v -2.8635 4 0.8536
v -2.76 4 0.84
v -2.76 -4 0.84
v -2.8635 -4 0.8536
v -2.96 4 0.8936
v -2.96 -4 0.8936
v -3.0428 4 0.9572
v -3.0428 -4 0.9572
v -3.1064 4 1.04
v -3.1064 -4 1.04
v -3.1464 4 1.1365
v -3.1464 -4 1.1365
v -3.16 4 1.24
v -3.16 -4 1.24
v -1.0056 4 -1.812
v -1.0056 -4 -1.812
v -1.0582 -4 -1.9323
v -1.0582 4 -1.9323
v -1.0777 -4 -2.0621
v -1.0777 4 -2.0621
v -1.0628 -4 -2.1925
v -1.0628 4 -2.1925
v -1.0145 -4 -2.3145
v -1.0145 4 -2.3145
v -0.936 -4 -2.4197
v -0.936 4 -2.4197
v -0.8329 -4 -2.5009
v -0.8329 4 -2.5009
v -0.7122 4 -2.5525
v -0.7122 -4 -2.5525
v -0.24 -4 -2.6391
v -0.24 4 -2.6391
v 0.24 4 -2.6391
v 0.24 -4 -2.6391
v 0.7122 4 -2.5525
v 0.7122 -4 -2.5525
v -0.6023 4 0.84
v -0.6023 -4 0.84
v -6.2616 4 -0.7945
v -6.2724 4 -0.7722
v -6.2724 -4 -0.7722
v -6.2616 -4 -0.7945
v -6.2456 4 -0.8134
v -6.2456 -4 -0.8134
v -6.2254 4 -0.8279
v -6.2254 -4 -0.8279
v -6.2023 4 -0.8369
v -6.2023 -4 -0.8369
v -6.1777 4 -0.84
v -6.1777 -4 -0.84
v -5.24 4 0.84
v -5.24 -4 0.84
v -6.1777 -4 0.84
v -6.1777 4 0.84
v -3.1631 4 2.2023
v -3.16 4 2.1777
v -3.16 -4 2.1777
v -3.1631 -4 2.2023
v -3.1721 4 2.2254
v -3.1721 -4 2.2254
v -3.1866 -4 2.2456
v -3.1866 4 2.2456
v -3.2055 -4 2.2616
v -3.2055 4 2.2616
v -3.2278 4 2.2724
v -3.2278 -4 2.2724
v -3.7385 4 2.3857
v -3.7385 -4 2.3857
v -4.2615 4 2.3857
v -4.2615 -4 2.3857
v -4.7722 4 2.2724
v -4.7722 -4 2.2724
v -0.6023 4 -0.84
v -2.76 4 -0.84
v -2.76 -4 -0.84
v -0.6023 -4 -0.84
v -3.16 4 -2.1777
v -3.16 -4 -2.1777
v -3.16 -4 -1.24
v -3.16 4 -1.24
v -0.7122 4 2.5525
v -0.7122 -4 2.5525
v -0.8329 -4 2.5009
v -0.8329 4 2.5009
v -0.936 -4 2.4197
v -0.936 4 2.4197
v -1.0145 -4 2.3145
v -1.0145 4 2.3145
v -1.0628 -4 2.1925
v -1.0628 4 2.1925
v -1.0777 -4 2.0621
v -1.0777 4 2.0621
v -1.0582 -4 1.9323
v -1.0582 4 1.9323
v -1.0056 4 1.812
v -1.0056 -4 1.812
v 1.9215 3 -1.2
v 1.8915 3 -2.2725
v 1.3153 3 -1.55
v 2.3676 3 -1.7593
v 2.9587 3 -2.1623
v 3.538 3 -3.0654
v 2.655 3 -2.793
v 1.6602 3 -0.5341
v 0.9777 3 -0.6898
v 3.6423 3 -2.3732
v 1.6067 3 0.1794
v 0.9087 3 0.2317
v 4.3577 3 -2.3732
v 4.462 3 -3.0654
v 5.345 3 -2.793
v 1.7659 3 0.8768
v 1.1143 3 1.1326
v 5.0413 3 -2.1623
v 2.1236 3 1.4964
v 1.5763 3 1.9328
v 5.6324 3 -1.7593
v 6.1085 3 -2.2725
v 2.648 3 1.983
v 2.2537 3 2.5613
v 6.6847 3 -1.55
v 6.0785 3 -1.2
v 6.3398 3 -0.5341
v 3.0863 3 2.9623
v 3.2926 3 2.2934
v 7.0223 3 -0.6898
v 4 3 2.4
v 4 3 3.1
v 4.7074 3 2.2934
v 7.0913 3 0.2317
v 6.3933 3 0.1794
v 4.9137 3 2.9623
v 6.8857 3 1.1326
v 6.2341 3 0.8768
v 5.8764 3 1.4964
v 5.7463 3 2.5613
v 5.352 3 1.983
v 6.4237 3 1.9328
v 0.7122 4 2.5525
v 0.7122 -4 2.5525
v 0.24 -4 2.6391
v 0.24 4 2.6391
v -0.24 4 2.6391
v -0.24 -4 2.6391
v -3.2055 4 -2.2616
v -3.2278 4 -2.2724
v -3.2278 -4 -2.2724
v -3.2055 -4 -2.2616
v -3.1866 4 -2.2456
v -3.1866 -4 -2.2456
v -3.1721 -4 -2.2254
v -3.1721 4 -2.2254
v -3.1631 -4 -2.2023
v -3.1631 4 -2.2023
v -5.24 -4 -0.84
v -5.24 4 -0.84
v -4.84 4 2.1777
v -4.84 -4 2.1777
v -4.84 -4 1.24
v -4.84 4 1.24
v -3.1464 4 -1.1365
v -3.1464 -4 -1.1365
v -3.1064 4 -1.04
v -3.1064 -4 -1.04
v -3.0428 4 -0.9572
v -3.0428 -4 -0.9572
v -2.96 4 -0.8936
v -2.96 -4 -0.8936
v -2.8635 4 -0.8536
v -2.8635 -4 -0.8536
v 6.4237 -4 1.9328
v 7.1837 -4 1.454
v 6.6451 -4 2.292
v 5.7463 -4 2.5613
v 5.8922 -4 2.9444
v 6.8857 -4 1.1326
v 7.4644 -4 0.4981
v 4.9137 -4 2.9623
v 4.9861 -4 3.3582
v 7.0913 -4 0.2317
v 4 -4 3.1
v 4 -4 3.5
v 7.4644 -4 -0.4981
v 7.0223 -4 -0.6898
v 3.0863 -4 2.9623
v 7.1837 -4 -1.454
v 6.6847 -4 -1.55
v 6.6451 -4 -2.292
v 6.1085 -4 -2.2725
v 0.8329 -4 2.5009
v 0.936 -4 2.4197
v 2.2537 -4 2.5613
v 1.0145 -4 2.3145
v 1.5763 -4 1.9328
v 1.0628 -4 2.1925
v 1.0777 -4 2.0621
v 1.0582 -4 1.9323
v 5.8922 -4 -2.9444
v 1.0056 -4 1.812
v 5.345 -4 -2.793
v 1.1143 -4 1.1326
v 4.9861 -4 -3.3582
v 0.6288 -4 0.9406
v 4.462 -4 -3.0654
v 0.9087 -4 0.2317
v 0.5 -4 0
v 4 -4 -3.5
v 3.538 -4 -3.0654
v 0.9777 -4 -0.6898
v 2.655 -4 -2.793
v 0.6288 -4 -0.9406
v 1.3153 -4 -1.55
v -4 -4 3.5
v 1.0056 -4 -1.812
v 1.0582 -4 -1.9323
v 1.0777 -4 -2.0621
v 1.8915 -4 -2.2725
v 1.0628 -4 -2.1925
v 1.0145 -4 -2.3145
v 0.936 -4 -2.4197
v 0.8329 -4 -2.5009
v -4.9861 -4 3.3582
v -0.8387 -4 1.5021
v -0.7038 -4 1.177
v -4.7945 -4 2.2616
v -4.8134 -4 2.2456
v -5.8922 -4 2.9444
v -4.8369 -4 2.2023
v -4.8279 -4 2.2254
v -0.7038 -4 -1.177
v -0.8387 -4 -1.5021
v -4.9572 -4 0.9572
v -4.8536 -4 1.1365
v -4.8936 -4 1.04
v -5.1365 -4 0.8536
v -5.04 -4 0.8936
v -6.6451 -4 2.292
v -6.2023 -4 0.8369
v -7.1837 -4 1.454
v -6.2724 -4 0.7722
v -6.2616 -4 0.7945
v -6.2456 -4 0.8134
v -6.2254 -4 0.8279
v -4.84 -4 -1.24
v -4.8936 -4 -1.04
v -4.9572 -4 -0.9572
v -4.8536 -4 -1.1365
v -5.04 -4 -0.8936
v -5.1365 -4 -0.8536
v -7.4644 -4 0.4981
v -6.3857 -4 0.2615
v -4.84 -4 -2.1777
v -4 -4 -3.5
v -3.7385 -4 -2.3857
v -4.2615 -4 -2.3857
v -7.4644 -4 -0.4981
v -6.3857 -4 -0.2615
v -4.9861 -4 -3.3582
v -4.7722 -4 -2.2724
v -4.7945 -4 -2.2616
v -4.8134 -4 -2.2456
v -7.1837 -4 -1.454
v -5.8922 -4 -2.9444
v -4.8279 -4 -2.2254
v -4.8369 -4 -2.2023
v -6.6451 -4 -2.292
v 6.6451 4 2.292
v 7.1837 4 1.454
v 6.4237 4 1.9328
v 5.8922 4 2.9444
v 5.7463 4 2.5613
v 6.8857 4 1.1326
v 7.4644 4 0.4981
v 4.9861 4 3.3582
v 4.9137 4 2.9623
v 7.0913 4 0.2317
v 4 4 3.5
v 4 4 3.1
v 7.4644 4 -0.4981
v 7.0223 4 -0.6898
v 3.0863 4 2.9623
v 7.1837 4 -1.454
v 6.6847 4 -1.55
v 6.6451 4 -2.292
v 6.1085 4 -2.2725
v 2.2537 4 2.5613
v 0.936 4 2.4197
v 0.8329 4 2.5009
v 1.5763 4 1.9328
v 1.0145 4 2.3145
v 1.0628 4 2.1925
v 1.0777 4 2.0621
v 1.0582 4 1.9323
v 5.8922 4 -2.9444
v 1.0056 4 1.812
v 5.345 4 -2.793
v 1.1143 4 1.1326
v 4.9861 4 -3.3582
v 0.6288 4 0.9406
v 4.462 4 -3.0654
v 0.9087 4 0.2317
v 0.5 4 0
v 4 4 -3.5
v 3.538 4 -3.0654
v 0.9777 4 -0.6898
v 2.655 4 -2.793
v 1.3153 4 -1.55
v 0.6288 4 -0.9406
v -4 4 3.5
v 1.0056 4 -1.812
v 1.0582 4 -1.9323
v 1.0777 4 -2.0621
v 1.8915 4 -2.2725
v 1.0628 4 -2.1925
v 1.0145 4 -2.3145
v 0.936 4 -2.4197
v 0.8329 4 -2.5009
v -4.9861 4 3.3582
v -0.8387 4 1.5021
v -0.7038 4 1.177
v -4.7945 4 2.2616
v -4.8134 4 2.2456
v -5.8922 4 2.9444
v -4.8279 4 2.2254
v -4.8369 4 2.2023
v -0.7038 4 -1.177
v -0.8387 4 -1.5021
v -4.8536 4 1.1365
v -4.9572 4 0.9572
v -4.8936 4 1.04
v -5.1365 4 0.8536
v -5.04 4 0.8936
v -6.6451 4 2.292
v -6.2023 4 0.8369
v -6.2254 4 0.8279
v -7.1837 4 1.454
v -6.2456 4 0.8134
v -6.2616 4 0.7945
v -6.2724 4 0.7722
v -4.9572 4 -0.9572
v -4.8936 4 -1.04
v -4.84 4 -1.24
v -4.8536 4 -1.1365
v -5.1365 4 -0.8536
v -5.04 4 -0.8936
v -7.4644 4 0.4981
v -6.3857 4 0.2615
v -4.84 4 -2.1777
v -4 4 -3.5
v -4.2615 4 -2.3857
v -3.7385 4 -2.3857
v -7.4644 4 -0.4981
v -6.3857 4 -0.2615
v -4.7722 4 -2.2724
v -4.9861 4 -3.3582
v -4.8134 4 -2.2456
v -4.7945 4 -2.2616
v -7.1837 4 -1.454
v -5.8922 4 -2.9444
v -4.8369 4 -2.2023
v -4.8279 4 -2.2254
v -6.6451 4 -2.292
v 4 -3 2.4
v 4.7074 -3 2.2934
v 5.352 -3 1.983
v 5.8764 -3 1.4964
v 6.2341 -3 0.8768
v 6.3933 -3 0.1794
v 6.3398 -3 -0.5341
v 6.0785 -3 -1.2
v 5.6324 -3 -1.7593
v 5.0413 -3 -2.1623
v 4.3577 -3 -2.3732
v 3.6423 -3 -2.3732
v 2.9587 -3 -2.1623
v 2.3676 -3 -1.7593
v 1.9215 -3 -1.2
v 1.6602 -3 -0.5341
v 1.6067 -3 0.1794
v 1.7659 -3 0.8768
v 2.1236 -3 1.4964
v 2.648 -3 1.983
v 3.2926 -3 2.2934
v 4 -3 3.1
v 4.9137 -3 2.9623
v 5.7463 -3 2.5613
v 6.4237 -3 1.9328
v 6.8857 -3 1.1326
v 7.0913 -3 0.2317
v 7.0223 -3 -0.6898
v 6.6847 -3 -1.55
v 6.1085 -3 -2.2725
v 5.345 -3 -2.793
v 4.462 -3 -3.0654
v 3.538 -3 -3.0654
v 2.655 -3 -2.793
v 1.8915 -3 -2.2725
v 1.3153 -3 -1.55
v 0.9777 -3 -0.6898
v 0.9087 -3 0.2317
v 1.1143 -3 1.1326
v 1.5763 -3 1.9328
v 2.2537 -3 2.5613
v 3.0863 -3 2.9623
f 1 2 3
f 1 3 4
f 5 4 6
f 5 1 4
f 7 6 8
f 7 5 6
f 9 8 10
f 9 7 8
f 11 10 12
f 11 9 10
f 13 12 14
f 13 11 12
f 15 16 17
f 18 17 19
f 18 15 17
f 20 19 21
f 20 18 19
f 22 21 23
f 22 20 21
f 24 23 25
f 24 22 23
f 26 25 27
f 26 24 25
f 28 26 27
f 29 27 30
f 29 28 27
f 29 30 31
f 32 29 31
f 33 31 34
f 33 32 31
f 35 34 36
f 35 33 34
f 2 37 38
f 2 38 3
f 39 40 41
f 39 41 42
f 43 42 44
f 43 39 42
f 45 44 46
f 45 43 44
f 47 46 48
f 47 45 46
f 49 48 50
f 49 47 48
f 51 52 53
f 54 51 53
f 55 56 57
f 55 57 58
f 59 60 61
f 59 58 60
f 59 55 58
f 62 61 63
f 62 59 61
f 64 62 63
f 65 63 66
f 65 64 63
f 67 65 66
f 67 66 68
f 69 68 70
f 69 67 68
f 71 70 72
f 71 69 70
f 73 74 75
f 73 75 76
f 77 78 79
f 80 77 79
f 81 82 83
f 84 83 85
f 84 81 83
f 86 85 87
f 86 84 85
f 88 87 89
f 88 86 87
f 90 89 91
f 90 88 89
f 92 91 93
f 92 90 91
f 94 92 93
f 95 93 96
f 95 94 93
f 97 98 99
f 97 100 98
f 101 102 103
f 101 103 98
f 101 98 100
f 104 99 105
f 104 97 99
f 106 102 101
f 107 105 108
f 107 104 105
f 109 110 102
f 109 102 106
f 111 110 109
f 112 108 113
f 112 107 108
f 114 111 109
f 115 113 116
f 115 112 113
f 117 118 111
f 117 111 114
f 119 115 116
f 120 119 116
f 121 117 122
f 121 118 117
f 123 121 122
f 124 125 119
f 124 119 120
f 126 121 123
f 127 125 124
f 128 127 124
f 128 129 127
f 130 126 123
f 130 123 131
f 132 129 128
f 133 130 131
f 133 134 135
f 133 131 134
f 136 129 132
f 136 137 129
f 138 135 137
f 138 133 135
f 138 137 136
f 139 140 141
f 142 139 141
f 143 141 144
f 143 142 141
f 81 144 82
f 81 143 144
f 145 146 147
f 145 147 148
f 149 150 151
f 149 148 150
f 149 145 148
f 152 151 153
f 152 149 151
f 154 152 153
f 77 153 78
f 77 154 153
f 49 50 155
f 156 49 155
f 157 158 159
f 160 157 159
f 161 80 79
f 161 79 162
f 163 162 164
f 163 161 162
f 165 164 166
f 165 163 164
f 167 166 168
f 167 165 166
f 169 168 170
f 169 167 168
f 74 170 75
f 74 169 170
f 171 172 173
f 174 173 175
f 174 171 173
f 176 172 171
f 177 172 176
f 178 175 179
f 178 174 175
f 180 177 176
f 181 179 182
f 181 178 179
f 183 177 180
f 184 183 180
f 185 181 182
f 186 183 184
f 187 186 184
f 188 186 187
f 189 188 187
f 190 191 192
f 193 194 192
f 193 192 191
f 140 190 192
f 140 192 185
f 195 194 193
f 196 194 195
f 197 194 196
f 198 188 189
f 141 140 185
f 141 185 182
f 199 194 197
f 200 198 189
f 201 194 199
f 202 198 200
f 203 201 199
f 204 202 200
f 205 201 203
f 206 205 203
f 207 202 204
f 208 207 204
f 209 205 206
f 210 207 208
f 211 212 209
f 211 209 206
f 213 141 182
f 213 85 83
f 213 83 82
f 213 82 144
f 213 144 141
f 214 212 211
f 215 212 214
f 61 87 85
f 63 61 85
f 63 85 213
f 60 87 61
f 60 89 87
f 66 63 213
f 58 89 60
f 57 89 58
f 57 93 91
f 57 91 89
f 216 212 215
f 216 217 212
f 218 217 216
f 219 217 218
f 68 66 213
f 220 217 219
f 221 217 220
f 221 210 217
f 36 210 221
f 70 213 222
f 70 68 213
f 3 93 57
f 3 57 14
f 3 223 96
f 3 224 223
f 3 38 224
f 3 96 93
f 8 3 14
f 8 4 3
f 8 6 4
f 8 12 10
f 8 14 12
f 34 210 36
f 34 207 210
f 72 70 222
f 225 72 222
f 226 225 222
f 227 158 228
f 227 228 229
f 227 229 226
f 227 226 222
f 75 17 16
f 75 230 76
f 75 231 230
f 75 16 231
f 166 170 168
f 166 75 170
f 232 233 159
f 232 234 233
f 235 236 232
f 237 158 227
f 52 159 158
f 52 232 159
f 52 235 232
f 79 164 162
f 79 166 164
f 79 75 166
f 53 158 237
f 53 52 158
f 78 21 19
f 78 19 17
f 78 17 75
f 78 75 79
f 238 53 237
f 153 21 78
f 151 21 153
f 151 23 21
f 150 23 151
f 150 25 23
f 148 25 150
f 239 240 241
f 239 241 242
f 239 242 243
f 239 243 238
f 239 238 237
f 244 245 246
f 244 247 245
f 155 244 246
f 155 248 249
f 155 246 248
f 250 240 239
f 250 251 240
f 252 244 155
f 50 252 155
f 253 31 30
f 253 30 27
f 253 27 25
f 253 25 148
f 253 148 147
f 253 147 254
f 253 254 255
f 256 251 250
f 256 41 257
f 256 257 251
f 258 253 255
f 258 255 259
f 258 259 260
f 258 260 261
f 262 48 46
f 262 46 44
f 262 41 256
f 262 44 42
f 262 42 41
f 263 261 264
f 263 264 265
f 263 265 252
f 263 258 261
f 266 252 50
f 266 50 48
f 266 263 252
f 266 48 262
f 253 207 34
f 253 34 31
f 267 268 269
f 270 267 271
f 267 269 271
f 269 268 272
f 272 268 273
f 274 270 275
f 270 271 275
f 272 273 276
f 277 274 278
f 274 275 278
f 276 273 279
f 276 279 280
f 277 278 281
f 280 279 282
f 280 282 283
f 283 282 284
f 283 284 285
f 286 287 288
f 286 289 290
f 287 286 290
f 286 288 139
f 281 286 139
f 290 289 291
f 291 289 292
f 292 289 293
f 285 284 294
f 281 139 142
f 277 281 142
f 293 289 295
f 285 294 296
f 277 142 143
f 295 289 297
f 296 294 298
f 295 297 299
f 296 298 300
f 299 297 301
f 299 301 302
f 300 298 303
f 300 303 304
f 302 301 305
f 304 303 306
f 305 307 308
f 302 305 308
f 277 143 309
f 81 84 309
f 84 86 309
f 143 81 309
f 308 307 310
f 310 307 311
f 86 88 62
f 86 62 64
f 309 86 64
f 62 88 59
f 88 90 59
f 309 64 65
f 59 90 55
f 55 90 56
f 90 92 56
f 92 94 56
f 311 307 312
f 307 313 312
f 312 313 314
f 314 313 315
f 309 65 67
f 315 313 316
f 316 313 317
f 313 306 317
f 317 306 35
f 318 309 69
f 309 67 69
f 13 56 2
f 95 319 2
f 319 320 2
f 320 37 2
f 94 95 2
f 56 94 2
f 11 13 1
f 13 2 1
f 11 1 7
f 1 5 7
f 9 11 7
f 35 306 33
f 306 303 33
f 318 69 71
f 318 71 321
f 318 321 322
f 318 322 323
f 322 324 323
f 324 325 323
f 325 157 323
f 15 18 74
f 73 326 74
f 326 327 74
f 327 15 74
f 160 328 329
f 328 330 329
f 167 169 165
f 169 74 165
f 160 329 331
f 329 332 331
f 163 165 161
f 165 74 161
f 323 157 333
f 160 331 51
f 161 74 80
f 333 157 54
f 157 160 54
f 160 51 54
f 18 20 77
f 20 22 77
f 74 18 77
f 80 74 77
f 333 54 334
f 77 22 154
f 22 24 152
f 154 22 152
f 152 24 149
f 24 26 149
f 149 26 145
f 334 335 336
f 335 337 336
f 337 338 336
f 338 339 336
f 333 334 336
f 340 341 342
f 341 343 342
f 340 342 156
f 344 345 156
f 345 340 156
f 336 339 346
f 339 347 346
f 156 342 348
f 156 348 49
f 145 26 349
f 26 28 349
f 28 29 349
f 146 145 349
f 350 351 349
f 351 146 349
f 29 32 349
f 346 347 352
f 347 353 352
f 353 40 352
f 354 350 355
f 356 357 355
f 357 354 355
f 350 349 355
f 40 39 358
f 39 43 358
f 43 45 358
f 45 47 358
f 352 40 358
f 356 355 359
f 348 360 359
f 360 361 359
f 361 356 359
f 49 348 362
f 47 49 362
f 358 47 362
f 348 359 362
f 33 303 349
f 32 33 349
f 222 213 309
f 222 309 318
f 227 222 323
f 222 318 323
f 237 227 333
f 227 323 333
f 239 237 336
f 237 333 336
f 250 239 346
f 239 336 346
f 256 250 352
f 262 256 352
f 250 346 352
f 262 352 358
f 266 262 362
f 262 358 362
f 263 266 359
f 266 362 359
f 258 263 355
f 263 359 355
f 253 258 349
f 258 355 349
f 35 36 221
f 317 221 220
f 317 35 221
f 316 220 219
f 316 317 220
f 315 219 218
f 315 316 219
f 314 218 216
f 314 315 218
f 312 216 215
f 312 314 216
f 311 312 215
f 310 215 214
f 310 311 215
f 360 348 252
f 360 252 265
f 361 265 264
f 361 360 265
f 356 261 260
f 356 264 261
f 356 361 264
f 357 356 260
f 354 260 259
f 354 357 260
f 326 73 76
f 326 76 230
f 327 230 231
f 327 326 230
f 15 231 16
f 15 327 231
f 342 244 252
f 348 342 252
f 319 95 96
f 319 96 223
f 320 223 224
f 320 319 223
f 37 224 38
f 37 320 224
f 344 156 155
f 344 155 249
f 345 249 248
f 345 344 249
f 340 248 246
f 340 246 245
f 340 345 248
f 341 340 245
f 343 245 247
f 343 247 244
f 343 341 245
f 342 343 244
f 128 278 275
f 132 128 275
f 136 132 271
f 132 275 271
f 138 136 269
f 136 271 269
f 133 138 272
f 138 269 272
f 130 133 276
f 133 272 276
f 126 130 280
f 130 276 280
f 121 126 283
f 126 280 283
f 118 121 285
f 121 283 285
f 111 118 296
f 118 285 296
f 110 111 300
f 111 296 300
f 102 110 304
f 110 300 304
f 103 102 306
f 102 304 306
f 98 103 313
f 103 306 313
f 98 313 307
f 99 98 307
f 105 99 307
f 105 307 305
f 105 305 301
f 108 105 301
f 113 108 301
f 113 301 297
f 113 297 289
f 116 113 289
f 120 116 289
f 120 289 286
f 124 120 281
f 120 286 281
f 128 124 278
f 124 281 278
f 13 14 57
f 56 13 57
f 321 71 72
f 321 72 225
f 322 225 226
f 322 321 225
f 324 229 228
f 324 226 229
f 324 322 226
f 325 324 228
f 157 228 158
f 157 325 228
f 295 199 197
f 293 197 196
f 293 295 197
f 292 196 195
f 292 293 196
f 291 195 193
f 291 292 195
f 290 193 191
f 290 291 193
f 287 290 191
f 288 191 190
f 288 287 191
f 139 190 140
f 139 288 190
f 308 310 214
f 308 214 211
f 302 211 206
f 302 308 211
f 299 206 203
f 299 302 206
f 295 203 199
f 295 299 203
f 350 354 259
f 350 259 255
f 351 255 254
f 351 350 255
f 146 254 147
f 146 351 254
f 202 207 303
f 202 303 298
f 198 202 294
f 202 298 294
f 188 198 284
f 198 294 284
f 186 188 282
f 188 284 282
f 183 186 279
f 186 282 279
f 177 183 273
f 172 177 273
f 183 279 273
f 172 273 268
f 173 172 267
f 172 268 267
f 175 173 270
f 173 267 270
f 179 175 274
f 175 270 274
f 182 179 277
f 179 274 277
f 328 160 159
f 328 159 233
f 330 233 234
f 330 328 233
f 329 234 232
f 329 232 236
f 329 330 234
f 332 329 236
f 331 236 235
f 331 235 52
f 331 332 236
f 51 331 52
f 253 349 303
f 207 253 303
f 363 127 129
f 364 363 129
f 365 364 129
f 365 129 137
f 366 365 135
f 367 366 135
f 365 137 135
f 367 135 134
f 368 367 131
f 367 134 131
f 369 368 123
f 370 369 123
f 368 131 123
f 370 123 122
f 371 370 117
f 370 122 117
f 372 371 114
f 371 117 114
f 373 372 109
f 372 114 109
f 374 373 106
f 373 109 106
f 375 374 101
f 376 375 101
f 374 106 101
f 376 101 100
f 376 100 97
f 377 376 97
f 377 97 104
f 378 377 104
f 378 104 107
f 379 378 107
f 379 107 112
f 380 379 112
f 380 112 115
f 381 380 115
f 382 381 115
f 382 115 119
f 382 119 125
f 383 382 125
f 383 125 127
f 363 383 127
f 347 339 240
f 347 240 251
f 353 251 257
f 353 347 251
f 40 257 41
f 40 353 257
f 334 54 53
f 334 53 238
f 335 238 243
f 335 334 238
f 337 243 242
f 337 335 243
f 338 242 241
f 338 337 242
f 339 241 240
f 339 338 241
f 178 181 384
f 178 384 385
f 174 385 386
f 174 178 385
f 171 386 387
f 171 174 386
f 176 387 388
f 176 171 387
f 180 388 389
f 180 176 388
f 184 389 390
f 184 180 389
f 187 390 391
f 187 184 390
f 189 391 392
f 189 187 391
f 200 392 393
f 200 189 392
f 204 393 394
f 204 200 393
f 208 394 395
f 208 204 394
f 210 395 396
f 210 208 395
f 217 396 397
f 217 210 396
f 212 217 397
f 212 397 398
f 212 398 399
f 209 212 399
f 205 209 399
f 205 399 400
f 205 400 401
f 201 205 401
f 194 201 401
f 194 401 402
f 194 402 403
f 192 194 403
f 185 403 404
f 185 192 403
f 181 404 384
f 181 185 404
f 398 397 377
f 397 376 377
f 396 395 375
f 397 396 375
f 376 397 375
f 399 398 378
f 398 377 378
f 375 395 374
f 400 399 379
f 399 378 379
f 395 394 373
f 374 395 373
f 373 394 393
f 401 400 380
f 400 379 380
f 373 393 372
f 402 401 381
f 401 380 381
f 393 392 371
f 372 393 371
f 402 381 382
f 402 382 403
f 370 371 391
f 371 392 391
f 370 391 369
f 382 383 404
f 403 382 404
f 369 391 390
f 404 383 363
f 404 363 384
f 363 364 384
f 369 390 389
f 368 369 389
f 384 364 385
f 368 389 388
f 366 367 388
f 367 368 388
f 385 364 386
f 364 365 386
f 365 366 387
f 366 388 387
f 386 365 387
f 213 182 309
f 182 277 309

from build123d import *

# Parameters (mm, degrees)
BOSS_EXTRUDE1_DEPTH = 4
SKETCH2_R           = 2.4
CUT_EXTRUDE1_DEPTH  = 12.510864433
SKETCH3_R           = 3.1
CUT_EXTRUDE2_DEPTH  = 1


with BuildPart() as part:
    # Sketch1 → Boss-Extrude1 (new, symmetric)
    with BuildSketch(Plane(origin=(0, 0, 0), x_dir=(1, 0, 0), z_dir=(0, 1, 0))):
        with BuildLine():
            Line((-4, 3.5), (4, 3.5))
            ThreePointArc((4, 3.5), (7.5, 0), (4, -3.5))
            Line((4, -3.5), (-4, -3.5))
            ThreePointArc((-4, -3.5), (-7.5, 0), (-4, 3.5))
        make_face()
    extrude(amount=BOSS_EXTRUDE1_DEPTH, both=True)

    # Sketch2 → Cut-Extrude1 (cut, through all)
    with BuildSketch(Plane(origin=(0, 4, 0), x_dir=(1, 0, 0), z_dir=(0, 1, 0))):
        with Locations(Location((4, 0, 0), (0, 0, 270))):
            Circle(SKETCH2_R)
        with BuildLine():
            Line((-4.84, -2.177705214), (-4.84, -1.24))
            ThreePointArc((-4.84, -1.24), (-4.957157288, -0.957157288), (-5.24, -0.84))
            Line((-5.24, -0.84), (-6.177705214, -0.84))
            ThreePointArc((-6.177705214, -0.84), (-6.235940121, -0.821293884), (-6.27238805, -0.772173913))
            ThreePointArc((-6.27238805, -0.772173913), (-6.4, 0), (-6.27238805, 0.772173913))
            ThreePointArc((-6.27238805, 0.772173913), (-6.235940121, 0.821293884), (-6.177705214, 0.84))
            Line((-6.177705214, 0.84), (-5.24, 0.84))
            ThreePointArc((-5.24, 0.84), (-4.957157288, 0.957157288), (-4.84, 1.24))
            Line((-4.84, 1.24), (-4.84, 2.177705214))
            ThreePointArc((-4.84, 2.177705214), (-4.821293884, 2.235940121), (-4.772173913, 2.27238805))
            ThreePointArc((-4.772173913, 2.27238805), (-4, 2.4), (-3.227826087, 2.27238805))
            ThreePointArc((-3.227826087, 2.27238805), (-3.178706116, 2.235940121), (-3.16, 2.177705214))
            Line((-3.16, 2.177705214), (-3.16, 1.24))
            ThreePointArc((-3.16, 1.24), (-3.042842712, 0.957157288), (-2.76, 0.84))
            Line((-2.76, 0.84), (-1.822294786, 0.84))
            Line((-1.822294786, 0.84), (-0.602294892, 0.84))
            ThreePointArc((-0.602294892, 0.84), (-0.767197546, 1.341263694), (-1.005585937, 1.812038747))
            ThreePointArc((-1.005585937, 1.812038747), (-1.042652048, 2.255086643), (-0.7121875, 2.552506408))
            ThreePointArc((-0.7121875, 2.552506408), (0, 2.65), (0.7121875, 2.552506408))
            ThreePointArc((0.7121875, 2.552506408), (1.042652048, 2.255086643), (1.005585937, 1.812038747))
            ThreePointArc((1.005585937, 1.812038747), (0.5, 0), (1.005585938, -1.812038747))
            ThreePointArc((1.005585938, -1.812038747), (1.042652048, -2.255086643), (0.7121875, -2.552506408))
            ThreePointArc((0.7121875, -2.552506408), (0, -2.65), (-0.7121875, -2.552506408))
            ThreePointArc((-0.7121875, -2.552506408), (-1.042652048, -2.255086643), (-1.005585937, -1.812038747))
            ThreePointArc((-1.005585937, -1.812038747), (-0.767197546, -1.341263694), (-0.602294892, -0.84))
            Line((-0.602294892, -0.84), (-1.822294786, -0.84))
            Line((-1.822294786, -0.84), (-2.76, -0.84))
            ThreePointArc((-2.76, -0.84), (-3.042842712, -0.957157288), (-3.16, -1.24))
            Line((-3.16, -1.24), (-3.16, -2.177705214))
            ThreePointArc((-3.16, -2.177705214), (-3.178706116, -2.235940121), (-3.227826087, -2.27238805))
            ThreePointArc((-3.227826087, -2.27238805), (-4, -2.4), (-4.772173913, -2.27238805))
            ThreePointArc((-4.772173913, -2.27238805), (-4.821293884, -2.235940121), (-4.84, -2.177705214))
        make_face()
    extrude(amount=-CUT_EXTRUDE1_DEPTH, mode=Mode.SUBTRACT)

    # Sketch3 → Cut-Extrude2 (cut)
    with BuildSketch(Plane(origin=(0, 4, 0), x_dir=(1, 0, 0), z_dir=(0, 1, 0))):
        with Locations(Location((4, 0, 0), (0, 0, 270))):
            Circle(SKETCH3_R)
    cut_extrude2 = extrude(amount=-CUT_EXTRUDE2_DEPTH, mode=Mode.SUBTRACT)

    # Mirror1: Cut-Extrude2 across plane
    add(cut_extrude2.mirror(Plane.ZX), mode=Mode.SUBTRACT)


solid = part.part
